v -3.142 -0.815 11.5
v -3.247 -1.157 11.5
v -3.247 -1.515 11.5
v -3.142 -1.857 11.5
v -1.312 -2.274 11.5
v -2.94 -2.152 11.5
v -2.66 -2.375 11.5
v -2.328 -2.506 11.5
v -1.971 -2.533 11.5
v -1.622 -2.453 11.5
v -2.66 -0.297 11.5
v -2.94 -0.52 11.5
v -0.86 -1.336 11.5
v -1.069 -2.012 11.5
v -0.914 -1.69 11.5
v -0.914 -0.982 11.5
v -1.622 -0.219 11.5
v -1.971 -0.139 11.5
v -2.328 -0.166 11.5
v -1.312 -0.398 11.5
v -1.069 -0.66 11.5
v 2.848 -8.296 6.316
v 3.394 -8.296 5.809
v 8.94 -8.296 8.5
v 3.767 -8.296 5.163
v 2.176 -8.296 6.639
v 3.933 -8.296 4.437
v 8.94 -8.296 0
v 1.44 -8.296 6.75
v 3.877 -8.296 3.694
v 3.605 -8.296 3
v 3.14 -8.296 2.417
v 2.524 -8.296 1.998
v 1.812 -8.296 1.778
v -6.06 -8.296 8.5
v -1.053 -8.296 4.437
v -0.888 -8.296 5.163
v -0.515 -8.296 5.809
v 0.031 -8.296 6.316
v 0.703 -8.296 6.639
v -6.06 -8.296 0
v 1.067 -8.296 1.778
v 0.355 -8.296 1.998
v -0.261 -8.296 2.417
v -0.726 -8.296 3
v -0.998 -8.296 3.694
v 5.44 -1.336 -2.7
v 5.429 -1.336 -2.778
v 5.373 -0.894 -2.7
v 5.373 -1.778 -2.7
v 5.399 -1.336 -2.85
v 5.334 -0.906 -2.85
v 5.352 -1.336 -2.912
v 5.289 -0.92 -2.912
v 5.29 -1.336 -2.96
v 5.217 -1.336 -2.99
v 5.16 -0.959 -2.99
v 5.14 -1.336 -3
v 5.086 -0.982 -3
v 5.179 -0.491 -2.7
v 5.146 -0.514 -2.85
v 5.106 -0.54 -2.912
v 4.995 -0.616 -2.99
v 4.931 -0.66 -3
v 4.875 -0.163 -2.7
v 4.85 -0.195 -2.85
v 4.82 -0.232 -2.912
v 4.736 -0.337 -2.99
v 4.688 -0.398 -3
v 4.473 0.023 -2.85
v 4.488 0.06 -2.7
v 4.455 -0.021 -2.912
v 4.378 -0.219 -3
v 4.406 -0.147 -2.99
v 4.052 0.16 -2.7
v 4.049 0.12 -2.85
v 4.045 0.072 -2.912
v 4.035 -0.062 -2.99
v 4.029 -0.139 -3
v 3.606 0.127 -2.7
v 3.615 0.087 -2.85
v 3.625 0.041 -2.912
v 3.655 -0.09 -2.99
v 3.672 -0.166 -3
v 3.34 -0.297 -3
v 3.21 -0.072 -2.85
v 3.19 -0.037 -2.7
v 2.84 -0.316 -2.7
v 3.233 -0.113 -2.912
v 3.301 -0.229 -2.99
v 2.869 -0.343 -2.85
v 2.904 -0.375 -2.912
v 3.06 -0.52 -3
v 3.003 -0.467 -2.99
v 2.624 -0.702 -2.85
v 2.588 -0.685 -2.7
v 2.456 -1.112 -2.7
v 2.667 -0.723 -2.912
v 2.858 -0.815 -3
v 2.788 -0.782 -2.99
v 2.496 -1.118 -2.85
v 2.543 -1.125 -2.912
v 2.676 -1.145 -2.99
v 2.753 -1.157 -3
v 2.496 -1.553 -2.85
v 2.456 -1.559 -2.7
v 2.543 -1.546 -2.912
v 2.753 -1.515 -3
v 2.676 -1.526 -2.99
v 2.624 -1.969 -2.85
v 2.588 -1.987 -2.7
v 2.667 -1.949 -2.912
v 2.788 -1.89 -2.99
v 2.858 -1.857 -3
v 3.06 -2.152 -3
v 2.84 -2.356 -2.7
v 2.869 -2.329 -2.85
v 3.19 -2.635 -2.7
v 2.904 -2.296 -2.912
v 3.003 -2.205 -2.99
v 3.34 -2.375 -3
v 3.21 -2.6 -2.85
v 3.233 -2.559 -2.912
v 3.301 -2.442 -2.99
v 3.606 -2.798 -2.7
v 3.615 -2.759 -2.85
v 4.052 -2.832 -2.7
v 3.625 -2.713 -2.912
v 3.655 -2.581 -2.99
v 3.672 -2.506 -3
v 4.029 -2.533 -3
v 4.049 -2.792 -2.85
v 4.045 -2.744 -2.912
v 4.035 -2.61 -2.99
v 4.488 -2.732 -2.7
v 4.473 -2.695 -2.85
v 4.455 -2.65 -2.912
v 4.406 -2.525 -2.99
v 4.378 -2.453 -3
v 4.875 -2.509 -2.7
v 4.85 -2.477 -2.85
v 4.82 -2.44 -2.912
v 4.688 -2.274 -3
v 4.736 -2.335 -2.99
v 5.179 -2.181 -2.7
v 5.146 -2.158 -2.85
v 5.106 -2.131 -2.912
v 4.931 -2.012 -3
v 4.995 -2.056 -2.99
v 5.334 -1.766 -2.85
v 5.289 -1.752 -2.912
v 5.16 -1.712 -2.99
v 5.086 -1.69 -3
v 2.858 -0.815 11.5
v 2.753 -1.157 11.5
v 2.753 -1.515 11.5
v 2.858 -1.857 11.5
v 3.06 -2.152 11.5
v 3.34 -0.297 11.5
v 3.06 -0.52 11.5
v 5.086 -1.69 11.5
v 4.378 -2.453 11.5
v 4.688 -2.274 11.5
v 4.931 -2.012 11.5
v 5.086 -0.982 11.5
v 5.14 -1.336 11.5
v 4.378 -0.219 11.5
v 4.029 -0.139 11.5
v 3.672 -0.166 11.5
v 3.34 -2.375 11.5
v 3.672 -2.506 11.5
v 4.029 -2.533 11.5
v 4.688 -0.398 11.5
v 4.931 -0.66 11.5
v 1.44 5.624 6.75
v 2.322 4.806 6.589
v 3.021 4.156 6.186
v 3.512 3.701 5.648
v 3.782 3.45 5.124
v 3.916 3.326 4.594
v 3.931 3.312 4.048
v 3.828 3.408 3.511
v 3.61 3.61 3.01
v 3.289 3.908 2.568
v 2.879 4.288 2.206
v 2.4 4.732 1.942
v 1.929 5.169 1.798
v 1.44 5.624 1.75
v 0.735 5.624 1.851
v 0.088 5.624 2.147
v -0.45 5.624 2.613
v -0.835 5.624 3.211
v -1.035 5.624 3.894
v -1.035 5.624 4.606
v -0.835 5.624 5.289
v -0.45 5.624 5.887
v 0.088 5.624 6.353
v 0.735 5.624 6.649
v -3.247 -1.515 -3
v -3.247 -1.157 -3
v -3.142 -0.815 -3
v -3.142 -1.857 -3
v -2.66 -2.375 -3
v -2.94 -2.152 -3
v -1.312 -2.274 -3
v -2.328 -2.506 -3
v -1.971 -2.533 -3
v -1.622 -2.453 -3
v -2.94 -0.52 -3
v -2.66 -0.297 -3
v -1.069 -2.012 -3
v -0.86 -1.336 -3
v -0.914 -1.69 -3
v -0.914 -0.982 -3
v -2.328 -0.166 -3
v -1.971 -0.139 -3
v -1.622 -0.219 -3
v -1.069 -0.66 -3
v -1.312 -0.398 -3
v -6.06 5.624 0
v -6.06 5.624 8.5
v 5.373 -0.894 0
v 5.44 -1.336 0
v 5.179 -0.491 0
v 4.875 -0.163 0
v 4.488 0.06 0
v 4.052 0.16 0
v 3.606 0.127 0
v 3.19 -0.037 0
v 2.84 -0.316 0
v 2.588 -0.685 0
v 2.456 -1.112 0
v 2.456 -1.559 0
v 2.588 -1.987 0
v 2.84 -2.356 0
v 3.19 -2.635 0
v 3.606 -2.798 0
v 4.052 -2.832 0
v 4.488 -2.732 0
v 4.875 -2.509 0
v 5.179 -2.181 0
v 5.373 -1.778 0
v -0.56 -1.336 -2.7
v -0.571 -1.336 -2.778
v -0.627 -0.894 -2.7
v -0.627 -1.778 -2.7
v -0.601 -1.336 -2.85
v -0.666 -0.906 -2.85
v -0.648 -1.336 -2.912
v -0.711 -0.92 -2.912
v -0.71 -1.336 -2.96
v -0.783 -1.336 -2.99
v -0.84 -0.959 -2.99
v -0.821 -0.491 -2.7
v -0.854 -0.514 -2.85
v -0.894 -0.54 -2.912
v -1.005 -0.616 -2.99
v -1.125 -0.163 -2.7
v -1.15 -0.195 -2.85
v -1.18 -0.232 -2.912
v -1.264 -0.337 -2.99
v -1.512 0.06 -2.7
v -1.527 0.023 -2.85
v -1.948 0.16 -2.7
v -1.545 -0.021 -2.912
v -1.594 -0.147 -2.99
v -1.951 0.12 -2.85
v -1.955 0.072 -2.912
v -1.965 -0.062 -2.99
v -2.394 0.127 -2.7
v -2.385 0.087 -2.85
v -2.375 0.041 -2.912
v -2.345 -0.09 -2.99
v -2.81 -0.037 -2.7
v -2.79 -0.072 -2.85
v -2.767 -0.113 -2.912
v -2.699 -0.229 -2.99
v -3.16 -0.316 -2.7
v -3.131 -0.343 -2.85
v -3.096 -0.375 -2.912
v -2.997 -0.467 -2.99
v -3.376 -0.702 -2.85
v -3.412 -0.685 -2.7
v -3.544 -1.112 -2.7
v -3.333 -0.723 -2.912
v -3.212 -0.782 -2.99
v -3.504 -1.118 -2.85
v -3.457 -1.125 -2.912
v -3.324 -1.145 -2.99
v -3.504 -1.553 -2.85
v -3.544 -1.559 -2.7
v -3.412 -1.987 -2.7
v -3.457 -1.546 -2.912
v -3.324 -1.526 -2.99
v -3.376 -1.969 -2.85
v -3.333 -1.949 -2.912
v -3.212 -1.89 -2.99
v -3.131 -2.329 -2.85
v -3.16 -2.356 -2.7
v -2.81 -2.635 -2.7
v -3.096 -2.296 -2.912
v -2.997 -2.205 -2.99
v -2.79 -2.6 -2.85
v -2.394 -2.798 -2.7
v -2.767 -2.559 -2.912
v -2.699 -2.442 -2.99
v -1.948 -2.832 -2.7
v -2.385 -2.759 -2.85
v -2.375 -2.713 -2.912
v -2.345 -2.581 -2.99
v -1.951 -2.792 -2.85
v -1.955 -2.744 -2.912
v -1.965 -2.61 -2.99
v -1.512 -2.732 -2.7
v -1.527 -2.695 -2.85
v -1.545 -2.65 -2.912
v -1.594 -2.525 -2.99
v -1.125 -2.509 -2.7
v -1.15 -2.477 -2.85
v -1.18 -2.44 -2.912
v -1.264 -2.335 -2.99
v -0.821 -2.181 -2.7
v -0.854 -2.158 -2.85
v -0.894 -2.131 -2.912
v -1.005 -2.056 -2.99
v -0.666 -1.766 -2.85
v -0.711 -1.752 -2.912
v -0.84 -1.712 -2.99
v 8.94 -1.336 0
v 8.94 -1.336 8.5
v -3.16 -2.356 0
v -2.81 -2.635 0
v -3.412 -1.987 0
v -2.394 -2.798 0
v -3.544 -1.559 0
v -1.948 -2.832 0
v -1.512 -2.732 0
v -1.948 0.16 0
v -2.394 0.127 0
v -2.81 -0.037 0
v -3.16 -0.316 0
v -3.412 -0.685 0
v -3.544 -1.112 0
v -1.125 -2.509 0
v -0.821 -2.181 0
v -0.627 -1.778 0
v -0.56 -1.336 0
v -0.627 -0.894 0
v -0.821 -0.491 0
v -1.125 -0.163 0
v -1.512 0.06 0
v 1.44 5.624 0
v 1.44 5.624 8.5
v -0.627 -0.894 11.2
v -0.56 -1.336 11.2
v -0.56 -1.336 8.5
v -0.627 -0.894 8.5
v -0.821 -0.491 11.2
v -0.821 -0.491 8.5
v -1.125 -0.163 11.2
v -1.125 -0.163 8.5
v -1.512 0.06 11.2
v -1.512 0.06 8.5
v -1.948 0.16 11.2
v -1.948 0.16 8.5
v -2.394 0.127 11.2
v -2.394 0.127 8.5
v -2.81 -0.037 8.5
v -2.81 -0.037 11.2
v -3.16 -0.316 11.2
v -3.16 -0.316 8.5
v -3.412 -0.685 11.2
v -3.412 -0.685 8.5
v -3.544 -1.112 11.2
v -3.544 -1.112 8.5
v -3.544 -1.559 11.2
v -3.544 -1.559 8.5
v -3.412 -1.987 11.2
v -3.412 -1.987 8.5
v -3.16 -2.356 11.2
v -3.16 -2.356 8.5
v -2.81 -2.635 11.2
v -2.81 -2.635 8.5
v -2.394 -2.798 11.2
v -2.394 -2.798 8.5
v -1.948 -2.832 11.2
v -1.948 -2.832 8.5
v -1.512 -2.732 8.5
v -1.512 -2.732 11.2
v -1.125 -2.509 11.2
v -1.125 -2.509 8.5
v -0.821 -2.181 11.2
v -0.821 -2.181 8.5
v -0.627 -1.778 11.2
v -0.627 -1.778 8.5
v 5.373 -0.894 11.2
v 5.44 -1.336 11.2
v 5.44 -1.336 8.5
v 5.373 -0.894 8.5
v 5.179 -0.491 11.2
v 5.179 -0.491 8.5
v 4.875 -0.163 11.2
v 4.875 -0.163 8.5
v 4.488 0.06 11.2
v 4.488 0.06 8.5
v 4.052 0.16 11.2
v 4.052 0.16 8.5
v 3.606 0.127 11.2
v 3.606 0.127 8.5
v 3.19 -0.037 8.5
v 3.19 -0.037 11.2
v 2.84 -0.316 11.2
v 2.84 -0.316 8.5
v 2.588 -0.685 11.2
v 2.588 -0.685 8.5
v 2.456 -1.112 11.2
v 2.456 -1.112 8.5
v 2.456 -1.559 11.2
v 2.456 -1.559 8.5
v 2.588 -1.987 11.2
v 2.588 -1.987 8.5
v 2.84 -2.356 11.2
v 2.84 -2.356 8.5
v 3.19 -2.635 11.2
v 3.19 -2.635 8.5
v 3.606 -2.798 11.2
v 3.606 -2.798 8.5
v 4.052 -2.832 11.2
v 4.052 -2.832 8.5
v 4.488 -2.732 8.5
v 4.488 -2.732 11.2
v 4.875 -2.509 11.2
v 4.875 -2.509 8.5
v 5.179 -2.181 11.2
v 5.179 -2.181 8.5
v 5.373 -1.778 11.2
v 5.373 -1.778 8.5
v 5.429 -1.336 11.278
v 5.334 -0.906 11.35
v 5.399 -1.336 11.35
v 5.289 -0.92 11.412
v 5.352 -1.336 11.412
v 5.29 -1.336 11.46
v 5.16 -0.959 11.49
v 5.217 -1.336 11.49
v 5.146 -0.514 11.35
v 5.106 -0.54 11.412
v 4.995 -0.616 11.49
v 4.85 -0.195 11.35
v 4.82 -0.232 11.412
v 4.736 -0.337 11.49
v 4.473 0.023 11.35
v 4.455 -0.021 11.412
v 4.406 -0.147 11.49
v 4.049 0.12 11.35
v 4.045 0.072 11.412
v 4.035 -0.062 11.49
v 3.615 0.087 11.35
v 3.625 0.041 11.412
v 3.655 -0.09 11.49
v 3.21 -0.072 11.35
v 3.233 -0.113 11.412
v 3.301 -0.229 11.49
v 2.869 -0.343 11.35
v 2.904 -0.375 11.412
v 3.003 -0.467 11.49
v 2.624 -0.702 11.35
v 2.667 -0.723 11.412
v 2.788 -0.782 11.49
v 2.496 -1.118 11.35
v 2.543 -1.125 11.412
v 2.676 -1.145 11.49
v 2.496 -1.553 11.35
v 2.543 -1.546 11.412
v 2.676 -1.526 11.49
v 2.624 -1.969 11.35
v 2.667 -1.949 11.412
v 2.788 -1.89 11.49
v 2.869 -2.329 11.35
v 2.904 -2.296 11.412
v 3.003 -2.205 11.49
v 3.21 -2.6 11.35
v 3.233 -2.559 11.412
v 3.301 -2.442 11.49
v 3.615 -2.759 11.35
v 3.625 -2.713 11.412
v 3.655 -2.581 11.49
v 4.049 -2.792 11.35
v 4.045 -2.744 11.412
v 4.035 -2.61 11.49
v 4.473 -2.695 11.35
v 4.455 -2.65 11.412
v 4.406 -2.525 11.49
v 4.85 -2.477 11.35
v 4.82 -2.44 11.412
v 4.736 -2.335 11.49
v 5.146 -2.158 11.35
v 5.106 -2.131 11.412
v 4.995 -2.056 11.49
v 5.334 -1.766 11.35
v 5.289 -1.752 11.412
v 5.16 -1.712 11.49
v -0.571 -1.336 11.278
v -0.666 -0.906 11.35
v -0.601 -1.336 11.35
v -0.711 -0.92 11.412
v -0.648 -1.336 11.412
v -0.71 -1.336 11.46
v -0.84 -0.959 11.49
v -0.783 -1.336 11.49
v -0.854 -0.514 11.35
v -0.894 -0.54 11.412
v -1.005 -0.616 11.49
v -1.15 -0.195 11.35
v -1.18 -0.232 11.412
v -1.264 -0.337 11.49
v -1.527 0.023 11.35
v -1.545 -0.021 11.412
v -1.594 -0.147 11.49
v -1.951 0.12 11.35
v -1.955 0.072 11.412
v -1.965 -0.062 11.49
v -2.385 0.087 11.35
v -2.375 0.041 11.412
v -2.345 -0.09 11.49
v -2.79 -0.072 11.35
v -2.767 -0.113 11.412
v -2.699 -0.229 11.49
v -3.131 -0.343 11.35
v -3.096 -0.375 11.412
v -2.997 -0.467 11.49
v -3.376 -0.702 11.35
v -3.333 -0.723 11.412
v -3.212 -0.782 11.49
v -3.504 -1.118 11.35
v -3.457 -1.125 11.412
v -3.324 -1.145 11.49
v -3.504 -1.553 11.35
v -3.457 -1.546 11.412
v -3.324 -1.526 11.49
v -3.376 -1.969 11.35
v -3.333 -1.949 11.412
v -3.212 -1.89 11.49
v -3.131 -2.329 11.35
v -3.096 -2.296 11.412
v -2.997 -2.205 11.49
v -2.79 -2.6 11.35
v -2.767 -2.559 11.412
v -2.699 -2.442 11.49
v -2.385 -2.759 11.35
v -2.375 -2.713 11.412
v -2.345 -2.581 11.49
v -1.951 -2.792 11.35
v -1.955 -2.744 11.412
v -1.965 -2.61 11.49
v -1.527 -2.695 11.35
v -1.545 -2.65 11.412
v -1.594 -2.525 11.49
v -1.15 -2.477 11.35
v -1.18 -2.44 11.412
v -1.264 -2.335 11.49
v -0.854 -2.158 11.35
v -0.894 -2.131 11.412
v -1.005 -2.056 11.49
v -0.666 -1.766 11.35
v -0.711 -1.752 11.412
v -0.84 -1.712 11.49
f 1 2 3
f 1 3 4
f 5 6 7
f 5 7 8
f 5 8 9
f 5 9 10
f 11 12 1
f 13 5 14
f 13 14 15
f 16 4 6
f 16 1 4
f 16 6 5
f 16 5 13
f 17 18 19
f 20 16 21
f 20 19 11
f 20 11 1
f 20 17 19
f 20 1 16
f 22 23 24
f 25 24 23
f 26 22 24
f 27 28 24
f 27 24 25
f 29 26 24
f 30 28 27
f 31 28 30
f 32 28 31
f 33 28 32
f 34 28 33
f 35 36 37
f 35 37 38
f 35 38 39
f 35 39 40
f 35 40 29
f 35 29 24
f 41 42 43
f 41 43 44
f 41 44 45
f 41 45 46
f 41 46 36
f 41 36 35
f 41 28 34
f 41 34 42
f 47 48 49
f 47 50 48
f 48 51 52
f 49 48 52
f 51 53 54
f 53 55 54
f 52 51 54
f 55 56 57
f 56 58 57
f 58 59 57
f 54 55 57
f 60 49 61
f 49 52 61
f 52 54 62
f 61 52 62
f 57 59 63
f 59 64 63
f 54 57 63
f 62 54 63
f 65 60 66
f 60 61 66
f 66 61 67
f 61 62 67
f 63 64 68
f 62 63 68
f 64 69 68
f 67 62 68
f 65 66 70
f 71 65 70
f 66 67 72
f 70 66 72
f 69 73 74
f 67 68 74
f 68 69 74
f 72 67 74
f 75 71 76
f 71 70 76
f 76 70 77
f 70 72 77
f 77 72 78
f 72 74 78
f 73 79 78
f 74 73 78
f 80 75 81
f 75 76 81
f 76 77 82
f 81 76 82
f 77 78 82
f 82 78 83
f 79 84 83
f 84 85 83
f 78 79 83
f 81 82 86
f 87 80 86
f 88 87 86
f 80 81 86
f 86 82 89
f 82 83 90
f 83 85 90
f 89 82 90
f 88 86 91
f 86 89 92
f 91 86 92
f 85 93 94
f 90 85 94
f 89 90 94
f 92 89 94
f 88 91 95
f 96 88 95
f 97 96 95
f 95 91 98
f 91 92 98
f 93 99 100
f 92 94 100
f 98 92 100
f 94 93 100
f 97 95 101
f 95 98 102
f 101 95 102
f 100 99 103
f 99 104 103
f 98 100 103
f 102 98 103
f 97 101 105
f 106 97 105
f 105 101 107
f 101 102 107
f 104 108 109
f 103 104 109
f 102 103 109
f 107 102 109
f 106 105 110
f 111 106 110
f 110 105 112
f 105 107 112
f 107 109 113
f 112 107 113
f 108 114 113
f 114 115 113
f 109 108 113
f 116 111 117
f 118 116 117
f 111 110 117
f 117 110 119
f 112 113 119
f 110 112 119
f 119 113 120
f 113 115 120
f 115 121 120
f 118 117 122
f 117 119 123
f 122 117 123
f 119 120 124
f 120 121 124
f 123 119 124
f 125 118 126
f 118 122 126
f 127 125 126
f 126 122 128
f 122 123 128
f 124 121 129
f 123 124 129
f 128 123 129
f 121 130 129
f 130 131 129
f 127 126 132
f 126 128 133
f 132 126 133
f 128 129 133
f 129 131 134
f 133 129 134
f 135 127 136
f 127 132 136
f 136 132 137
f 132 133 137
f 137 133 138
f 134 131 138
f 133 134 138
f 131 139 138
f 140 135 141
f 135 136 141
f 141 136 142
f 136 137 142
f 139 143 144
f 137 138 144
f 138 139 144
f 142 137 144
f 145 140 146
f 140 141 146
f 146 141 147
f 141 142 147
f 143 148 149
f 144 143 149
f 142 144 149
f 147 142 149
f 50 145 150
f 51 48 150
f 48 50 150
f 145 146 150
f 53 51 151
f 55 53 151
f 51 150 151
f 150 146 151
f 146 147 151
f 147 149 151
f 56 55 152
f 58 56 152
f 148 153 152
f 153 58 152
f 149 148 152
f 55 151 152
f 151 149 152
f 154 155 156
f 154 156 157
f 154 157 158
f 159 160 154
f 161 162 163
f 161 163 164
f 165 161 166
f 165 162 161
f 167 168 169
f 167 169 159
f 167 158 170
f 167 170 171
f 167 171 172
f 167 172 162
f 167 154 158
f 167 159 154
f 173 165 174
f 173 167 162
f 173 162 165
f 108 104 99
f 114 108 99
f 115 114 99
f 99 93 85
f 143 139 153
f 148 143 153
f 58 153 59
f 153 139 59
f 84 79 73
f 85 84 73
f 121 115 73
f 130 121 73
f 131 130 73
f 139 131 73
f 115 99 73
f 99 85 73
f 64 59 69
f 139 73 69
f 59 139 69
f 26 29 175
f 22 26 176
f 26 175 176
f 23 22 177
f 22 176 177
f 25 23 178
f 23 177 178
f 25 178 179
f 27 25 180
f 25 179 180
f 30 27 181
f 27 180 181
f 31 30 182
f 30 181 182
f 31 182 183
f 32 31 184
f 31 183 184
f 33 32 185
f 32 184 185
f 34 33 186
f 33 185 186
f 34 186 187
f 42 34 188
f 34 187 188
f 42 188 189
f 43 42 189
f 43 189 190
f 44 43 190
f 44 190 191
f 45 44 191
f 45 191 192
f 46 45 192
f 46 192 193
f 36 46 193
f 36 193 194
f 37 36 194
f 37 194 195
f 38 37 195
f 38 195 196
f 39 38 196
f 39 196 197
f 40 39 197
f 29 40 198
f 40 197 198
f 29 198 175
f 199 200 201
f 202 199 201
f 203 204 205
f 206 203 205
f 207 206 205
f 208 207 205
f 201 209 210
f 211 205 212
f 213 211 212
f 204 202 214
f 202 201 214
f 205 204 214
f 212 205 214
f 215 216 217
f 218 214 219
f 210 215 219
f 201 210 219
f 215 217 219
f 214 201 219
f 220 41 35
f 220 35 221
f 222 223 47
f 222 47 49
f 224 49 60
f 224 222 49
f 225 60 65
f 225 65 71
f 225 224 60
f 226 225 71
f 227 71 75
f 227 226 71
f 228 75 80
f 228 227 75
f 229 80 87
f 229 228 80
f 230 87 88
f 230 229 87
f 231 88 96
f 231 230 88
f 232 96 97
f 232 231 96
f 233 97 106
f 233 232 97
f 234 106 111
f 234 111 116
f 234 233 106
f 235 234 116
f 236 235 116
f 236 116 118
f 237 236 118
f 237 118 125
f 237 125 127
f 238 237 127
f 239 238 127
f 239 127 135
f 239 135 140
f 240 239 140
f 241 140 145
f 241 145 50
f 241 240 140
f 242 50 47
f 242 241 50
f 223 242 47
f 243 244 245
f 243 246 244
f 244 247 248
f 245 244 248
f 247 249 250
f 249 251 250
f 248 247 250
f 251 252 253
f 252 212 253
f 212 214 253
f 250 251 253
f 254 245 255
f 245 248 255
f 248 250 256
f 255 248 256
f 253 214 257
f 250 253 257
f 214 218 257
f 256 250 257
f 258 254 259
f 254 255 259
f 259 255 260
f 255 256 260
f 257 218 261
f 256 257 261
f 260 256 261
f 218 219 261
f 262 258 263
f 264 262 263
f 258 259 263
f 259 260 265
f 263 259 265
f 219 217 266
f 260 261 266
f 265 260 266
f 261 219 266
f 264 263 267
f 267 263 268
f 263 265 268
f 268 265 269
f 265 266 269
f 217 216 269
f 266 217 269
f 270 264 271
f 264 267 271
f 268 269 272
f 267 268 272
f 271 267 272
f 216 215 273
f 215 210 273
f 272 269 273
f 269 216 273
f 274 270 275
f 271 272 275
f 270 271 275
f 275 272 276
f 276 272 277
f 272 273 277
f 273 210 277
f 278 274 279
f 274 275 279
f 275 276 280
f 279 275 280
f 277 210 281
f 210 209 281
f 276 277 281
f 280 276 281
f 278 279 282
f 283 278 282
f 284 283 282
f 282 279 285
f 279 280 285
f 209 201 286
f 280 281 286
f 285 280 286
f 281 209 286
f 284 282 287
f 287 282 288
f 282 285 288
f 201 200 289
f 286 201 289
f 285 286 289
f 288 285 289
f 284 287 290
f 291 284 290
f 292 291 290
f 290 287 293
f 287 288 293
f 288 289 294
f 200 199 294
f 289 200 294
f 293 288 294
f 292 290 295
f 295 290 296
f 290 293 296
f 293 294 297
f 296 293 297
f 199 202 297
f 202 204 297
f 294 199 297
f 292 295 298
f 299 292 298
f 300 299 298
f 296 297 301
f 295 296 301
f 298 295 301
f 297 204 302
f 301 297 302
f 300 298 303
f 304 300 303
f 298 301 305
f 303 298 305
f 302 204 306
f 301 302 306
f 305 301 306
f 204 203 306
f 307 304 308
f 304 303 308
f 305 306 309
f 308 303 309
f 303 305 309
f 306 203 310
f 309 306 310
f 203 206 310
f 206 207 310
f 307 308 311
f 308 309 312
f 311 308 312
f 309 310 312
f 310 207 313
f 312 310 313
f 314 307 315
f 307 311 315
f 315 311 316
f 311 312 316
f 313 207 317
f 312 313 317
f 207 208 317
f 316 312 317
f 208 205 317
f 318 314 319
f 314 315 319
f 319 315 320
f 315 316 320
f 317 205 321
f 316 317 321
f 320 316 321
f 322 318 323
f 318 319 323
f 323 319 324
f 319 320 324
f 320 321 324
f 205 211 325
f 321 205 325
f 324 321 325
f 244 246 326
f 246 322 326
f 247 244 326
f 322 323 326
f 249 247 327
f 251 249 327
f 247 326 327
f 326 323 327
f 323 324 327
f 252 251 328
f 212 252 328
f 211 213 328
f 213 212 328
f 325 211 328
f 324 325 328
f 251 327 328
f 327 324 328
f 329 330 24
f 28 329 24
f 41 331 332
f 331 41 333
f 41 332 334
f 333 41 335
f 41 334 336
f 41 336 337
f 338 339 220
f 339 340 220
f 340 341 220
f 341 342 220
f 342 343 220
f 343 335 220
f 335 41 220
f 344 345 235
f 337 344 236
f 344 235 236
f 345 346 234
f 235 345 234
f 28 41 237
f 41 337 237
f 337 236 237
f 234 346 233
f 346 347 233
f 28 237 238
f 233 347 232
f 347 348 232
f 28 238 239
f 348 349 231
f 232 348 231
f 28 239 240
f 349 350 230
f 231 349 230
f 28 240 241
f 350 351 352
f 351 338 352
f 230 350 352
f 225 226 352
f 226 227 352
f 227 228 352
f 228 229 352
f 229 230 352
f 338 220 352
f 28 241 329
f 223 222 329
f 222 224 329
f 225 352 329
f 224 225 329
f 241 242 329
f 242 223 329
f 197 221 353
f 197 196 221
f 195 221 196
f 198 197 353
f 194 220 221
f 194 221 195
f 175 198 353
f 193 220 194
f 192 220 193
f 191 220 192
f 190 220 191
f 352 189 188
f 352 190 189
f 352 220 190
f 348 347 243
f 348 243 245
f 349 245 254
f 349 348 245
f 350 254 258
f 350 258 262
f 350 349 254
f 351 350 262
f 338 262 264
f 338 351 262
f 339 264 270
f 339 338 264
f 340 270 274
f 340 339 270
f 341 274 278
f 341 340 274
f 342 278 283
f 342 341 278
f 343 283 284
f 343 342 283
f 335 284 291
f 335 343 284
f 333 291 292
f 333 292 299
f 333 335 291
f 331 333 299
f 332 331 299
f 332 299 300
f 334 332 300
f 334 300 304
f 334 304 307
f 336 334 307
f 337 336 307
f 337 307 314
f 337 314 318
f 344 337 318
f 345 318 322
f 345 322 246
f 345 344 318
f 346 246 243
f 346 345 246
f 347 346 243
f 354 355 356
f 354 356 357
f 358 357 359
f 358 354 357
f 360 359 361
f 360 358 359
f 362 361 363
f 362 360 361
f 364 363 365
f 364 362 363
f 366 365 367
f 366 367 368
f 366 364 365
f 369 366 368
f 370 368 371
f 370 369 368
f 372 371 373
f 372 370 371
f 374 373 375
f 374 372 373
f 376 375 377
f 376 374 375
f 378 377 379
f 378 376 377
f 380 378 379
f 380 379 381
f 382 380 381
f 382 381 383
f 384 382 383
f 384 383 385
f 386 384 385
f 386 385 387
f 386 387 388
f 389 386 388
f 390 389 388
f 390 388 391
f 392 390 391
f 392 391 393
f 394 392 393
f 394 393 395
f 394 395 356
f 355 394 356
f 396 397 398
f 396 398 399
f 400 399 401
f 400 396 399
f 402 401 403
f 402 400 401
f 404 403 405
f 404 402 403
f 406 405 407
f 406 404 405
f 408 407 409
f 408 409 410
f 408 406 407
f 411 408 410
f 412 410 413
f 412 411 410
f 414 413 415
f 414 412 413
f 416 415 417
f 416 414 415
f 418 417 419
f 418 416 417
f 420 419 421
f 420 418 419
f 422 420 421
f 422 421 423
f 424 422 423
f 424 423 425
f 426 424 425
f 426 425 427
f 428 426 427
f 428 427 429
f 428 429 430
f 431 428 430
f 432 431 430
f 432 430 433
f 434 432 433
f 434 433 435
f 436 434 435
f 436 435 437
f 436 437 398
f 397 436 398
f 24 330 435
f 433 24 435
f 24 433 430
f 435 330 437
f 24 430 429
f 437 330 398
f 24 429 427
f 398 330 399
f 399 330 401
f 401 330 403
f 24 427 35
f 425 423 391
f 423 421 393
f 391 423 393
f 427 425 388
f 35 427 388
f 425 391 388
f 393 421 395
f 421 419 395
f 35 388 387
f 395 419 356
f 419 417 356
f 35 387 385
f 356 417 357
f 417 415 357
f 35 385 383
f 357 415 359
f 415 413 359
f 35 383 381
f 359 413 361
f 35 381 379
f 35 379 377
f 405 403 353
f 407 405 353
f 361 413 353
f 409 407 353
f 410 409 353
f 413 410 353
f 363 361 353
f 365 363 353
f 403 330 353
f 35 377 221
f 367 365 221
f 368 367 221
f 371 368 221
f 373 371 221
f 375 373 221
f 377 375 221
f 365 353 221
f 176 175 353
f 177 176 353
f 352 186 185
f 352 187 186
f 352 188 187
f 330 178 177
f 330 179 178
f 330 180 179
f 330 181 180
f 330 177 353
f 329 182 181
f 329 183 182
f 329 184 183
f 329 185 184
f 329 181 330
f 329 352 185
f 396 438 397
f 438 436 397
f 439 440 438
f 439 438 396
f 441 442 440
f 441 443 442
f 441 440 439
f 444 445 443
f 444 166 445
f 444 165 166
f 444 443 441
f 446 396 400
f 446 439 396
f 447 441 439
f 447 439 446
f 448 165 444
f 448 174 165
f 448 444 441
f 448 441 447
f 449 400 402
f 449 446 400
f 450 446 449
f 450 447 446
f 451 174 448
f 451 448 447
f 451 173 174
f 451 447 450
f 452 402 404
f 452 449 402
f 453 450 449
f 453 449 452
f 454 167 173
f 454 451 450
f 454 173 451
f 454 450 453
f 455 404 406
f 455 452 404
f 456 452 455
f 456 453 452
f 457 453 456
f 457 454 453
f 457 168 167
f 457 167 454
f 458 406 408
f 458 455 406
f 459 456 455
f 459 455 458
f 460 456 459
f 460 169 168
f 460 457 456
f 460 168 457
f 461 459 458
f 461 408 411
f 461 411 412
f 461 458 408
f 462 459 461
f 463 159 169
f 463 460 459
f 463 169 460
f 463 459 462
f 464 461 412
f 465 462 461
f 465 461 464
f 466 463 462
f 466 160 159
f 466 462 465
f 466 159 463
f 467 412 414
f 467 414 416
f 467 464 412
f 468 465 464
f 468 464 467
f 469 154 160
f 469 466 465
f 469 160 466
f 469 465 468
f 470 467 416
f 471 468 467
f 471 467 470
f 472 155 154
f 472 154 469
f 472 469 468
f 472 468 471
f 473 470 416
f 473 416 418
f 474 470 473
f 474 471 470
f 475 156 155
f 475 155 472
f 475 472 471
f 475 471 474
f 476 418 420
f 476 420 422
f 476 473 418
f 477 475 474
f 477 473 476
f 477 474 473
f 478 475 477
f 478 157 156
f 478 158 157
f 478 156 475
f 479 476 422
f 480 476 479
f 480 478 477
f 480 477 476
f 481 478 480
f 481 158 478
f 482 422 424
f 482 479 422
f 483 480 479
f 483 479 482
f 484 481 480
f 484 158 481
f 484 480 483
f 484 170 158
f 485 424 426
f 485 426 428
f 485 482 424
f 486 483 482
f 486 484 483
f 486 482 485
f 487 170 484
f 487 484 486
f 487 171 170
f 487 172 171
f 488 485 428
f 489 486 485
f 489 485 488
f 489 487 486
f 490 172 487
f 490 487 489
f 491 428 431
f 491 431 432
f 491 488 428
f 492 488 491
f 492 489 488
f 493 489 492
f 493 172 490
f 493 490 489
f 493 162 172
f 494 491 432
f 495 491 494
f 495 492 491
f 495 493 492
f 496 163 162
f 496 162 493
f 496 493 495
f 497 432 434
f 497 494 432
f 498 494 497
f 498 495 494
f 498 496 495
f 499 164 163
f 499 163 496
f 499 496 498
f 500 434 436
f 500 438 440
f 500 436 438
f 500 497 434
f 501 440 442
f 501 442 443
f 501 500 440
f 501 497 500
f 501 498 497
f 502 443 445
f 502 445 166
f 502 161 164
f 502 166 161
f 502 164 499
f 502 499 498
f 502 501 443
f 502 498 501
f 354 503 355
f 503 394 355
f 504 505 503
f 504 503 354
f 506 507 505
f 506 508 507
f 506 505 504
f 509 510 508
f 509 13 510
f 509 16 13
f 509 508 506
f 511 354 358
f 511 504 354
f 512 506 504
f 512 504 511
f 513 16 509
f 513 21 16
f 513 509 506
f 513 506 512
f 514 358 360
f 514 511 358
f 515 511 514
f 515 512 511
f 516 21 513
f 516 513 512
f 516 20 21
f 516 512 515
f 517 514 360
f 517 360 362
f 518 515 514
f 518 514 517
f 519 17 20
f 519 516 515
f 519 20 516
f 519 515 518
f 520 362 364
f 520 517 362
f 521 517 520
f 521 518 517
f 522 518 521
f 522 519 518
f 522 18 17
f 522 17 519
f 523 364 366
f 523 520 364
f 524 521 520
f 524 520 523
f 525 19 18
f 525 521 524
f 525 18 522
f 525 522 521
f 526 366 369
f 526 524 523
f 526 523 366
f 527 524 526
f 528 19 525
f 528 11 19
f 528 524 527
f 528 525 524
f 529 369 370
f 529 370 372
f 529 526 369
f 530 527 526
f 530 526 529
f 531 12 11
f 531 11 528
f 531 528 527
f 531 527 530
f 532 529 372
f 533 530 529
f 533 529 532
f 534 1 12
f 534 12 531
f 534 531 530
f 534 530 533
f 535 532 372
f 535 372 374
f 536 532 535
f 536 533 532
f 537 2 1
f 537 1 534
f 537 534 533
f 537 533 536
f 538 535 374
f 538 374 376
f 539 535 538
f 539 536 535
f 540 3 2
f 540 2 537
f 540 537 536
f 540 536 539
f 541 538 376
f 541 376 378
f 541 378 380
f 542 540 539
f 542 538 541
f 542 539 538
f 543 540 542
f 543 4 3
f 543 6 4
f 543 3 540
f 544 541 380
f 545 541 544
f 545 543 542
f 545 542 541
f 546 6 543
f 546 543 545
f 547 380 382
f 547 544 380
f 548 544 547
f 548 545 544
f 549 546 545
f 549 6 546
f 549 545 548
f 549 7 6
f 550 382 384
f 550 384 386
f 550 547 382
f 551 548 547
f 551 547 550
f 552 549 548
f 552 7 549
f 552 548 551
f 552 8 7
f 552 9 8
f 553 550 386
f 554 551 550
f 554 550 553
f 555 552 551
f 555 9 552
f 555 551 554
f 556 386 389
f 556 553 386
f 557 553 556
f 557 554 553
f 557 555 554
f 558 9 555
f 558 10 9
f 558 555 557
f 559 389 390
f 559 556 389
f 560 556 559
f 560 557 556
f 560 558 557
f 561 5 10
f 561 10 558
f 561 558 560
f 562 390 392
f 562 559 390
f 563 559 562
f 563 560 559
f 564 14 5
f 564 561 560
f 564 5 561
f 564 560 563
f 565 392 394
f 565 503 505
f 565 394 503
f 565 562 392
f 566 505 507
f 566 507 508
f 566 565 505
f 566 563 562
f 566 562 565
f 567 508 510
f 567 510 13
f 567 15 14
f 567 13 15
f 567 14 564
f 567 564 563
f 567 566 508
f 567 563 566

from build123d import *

# Parameters (mm, degrees)
SKETCH_1_R         = 1.5
EXTRUDE_1_DEPTH    = 8.5
SKETCH_1_3_R       = 1.5
EXTRUDE_2_DEPTH    = 3
EXTRUDE_START      = 11.5
SKETCH_1_4_R       = 1.5
EXTRUDE_3_DEPTH    = 11.5
HOLE_WIZARD_M6_1_D = 5
FILLET_1_R         = 0.3


with BuildPart() as part:
    # 스케치1 → 보스-돌출1 (new body)
    # profile 1 of 3: a face of its own
    with BuildSketch(Plane.XY):
        Polygon((8.939511347, -1.33586653), (8.939511347, -8.29586653), (-6.060488653, -8.29586653), (-6.060488653, 5.62413347), (1.439511347, 5.62413347), align=None)
        with Locations((3.939511347, -1.33586653)):
            Circle(SKETCH_1_R, mode=Mode.SUBTRACT)
        with Locations((-2.060488653, -1.33586653)):
            Circle(SKETCH_1_R, mode=Mode.SUBTRACT)
    # profile 2 of 3: a face of its own
    with BuildSketch(Plane.XY):
        with Locations((3.939511347, -1.33586653)):
            Circle(SKETCH_1_R)
    # profile 3 of 3: a face of its own
    with BuildSketch(Plane.XY):
        with Locations((-2.060488653, -1.33586653)):
            Circle(SKETCH_1_R)
    extrude(amount=EXTRUDE_1_DEPTH)

    # 스케치1<3> → 보스-돌출2 (add)
    with BuildSketch(Plane.XY):
        with Locations((3.939511347, -1.33586653)):
            Circle(SKETCH_1_3_R)
        with Locations((-2.060488653, -1.33586653)):
            Circle(SKETCH_1_3_R)
    extrude(amount=-EXTRUDE_2_DEPTH)

    # 스케치1<4> → 보스-돌출3 (add)
    with BuildSketch(Plane.XY.offset(EXTRUDE_START)):
        with Locations((-2.060488653, -1.33586653)):
            Circle(SKETCH_1_4_R)
        with Locations((3.939511347, -1.33586653)):
            Circle(SKETCH_1_4_R)
    extrude(amount=-EXTRUDE_3_DEPTH)

    # M6 탭을 위한 탭 드릴1 (through all)
    with Locations(Plane(origin=(1.439511347, -8.29586653, 4.25), x_dir=(0, 0, -1), z_dir=(0, -1, 0))):
        with Locations((0, 0)):
            Hole(HOLE_WIZARD_M6_1_D / 2)

    # 필렛1
    fillet_1_edges = [part.edges().sort_by_distance(p)[0] for p in [
        (2.439511347, -1.33586653, -3),
        (-3.560488653, -1.33586653, -3),
        (-3.560488653, -1.33586653, 11.5),
        (2.439511347, -1.33586653, 11.5),
    ]]
    fillet(fillet_1_edges, radius=FILLET_1_R)


solid = part.part
